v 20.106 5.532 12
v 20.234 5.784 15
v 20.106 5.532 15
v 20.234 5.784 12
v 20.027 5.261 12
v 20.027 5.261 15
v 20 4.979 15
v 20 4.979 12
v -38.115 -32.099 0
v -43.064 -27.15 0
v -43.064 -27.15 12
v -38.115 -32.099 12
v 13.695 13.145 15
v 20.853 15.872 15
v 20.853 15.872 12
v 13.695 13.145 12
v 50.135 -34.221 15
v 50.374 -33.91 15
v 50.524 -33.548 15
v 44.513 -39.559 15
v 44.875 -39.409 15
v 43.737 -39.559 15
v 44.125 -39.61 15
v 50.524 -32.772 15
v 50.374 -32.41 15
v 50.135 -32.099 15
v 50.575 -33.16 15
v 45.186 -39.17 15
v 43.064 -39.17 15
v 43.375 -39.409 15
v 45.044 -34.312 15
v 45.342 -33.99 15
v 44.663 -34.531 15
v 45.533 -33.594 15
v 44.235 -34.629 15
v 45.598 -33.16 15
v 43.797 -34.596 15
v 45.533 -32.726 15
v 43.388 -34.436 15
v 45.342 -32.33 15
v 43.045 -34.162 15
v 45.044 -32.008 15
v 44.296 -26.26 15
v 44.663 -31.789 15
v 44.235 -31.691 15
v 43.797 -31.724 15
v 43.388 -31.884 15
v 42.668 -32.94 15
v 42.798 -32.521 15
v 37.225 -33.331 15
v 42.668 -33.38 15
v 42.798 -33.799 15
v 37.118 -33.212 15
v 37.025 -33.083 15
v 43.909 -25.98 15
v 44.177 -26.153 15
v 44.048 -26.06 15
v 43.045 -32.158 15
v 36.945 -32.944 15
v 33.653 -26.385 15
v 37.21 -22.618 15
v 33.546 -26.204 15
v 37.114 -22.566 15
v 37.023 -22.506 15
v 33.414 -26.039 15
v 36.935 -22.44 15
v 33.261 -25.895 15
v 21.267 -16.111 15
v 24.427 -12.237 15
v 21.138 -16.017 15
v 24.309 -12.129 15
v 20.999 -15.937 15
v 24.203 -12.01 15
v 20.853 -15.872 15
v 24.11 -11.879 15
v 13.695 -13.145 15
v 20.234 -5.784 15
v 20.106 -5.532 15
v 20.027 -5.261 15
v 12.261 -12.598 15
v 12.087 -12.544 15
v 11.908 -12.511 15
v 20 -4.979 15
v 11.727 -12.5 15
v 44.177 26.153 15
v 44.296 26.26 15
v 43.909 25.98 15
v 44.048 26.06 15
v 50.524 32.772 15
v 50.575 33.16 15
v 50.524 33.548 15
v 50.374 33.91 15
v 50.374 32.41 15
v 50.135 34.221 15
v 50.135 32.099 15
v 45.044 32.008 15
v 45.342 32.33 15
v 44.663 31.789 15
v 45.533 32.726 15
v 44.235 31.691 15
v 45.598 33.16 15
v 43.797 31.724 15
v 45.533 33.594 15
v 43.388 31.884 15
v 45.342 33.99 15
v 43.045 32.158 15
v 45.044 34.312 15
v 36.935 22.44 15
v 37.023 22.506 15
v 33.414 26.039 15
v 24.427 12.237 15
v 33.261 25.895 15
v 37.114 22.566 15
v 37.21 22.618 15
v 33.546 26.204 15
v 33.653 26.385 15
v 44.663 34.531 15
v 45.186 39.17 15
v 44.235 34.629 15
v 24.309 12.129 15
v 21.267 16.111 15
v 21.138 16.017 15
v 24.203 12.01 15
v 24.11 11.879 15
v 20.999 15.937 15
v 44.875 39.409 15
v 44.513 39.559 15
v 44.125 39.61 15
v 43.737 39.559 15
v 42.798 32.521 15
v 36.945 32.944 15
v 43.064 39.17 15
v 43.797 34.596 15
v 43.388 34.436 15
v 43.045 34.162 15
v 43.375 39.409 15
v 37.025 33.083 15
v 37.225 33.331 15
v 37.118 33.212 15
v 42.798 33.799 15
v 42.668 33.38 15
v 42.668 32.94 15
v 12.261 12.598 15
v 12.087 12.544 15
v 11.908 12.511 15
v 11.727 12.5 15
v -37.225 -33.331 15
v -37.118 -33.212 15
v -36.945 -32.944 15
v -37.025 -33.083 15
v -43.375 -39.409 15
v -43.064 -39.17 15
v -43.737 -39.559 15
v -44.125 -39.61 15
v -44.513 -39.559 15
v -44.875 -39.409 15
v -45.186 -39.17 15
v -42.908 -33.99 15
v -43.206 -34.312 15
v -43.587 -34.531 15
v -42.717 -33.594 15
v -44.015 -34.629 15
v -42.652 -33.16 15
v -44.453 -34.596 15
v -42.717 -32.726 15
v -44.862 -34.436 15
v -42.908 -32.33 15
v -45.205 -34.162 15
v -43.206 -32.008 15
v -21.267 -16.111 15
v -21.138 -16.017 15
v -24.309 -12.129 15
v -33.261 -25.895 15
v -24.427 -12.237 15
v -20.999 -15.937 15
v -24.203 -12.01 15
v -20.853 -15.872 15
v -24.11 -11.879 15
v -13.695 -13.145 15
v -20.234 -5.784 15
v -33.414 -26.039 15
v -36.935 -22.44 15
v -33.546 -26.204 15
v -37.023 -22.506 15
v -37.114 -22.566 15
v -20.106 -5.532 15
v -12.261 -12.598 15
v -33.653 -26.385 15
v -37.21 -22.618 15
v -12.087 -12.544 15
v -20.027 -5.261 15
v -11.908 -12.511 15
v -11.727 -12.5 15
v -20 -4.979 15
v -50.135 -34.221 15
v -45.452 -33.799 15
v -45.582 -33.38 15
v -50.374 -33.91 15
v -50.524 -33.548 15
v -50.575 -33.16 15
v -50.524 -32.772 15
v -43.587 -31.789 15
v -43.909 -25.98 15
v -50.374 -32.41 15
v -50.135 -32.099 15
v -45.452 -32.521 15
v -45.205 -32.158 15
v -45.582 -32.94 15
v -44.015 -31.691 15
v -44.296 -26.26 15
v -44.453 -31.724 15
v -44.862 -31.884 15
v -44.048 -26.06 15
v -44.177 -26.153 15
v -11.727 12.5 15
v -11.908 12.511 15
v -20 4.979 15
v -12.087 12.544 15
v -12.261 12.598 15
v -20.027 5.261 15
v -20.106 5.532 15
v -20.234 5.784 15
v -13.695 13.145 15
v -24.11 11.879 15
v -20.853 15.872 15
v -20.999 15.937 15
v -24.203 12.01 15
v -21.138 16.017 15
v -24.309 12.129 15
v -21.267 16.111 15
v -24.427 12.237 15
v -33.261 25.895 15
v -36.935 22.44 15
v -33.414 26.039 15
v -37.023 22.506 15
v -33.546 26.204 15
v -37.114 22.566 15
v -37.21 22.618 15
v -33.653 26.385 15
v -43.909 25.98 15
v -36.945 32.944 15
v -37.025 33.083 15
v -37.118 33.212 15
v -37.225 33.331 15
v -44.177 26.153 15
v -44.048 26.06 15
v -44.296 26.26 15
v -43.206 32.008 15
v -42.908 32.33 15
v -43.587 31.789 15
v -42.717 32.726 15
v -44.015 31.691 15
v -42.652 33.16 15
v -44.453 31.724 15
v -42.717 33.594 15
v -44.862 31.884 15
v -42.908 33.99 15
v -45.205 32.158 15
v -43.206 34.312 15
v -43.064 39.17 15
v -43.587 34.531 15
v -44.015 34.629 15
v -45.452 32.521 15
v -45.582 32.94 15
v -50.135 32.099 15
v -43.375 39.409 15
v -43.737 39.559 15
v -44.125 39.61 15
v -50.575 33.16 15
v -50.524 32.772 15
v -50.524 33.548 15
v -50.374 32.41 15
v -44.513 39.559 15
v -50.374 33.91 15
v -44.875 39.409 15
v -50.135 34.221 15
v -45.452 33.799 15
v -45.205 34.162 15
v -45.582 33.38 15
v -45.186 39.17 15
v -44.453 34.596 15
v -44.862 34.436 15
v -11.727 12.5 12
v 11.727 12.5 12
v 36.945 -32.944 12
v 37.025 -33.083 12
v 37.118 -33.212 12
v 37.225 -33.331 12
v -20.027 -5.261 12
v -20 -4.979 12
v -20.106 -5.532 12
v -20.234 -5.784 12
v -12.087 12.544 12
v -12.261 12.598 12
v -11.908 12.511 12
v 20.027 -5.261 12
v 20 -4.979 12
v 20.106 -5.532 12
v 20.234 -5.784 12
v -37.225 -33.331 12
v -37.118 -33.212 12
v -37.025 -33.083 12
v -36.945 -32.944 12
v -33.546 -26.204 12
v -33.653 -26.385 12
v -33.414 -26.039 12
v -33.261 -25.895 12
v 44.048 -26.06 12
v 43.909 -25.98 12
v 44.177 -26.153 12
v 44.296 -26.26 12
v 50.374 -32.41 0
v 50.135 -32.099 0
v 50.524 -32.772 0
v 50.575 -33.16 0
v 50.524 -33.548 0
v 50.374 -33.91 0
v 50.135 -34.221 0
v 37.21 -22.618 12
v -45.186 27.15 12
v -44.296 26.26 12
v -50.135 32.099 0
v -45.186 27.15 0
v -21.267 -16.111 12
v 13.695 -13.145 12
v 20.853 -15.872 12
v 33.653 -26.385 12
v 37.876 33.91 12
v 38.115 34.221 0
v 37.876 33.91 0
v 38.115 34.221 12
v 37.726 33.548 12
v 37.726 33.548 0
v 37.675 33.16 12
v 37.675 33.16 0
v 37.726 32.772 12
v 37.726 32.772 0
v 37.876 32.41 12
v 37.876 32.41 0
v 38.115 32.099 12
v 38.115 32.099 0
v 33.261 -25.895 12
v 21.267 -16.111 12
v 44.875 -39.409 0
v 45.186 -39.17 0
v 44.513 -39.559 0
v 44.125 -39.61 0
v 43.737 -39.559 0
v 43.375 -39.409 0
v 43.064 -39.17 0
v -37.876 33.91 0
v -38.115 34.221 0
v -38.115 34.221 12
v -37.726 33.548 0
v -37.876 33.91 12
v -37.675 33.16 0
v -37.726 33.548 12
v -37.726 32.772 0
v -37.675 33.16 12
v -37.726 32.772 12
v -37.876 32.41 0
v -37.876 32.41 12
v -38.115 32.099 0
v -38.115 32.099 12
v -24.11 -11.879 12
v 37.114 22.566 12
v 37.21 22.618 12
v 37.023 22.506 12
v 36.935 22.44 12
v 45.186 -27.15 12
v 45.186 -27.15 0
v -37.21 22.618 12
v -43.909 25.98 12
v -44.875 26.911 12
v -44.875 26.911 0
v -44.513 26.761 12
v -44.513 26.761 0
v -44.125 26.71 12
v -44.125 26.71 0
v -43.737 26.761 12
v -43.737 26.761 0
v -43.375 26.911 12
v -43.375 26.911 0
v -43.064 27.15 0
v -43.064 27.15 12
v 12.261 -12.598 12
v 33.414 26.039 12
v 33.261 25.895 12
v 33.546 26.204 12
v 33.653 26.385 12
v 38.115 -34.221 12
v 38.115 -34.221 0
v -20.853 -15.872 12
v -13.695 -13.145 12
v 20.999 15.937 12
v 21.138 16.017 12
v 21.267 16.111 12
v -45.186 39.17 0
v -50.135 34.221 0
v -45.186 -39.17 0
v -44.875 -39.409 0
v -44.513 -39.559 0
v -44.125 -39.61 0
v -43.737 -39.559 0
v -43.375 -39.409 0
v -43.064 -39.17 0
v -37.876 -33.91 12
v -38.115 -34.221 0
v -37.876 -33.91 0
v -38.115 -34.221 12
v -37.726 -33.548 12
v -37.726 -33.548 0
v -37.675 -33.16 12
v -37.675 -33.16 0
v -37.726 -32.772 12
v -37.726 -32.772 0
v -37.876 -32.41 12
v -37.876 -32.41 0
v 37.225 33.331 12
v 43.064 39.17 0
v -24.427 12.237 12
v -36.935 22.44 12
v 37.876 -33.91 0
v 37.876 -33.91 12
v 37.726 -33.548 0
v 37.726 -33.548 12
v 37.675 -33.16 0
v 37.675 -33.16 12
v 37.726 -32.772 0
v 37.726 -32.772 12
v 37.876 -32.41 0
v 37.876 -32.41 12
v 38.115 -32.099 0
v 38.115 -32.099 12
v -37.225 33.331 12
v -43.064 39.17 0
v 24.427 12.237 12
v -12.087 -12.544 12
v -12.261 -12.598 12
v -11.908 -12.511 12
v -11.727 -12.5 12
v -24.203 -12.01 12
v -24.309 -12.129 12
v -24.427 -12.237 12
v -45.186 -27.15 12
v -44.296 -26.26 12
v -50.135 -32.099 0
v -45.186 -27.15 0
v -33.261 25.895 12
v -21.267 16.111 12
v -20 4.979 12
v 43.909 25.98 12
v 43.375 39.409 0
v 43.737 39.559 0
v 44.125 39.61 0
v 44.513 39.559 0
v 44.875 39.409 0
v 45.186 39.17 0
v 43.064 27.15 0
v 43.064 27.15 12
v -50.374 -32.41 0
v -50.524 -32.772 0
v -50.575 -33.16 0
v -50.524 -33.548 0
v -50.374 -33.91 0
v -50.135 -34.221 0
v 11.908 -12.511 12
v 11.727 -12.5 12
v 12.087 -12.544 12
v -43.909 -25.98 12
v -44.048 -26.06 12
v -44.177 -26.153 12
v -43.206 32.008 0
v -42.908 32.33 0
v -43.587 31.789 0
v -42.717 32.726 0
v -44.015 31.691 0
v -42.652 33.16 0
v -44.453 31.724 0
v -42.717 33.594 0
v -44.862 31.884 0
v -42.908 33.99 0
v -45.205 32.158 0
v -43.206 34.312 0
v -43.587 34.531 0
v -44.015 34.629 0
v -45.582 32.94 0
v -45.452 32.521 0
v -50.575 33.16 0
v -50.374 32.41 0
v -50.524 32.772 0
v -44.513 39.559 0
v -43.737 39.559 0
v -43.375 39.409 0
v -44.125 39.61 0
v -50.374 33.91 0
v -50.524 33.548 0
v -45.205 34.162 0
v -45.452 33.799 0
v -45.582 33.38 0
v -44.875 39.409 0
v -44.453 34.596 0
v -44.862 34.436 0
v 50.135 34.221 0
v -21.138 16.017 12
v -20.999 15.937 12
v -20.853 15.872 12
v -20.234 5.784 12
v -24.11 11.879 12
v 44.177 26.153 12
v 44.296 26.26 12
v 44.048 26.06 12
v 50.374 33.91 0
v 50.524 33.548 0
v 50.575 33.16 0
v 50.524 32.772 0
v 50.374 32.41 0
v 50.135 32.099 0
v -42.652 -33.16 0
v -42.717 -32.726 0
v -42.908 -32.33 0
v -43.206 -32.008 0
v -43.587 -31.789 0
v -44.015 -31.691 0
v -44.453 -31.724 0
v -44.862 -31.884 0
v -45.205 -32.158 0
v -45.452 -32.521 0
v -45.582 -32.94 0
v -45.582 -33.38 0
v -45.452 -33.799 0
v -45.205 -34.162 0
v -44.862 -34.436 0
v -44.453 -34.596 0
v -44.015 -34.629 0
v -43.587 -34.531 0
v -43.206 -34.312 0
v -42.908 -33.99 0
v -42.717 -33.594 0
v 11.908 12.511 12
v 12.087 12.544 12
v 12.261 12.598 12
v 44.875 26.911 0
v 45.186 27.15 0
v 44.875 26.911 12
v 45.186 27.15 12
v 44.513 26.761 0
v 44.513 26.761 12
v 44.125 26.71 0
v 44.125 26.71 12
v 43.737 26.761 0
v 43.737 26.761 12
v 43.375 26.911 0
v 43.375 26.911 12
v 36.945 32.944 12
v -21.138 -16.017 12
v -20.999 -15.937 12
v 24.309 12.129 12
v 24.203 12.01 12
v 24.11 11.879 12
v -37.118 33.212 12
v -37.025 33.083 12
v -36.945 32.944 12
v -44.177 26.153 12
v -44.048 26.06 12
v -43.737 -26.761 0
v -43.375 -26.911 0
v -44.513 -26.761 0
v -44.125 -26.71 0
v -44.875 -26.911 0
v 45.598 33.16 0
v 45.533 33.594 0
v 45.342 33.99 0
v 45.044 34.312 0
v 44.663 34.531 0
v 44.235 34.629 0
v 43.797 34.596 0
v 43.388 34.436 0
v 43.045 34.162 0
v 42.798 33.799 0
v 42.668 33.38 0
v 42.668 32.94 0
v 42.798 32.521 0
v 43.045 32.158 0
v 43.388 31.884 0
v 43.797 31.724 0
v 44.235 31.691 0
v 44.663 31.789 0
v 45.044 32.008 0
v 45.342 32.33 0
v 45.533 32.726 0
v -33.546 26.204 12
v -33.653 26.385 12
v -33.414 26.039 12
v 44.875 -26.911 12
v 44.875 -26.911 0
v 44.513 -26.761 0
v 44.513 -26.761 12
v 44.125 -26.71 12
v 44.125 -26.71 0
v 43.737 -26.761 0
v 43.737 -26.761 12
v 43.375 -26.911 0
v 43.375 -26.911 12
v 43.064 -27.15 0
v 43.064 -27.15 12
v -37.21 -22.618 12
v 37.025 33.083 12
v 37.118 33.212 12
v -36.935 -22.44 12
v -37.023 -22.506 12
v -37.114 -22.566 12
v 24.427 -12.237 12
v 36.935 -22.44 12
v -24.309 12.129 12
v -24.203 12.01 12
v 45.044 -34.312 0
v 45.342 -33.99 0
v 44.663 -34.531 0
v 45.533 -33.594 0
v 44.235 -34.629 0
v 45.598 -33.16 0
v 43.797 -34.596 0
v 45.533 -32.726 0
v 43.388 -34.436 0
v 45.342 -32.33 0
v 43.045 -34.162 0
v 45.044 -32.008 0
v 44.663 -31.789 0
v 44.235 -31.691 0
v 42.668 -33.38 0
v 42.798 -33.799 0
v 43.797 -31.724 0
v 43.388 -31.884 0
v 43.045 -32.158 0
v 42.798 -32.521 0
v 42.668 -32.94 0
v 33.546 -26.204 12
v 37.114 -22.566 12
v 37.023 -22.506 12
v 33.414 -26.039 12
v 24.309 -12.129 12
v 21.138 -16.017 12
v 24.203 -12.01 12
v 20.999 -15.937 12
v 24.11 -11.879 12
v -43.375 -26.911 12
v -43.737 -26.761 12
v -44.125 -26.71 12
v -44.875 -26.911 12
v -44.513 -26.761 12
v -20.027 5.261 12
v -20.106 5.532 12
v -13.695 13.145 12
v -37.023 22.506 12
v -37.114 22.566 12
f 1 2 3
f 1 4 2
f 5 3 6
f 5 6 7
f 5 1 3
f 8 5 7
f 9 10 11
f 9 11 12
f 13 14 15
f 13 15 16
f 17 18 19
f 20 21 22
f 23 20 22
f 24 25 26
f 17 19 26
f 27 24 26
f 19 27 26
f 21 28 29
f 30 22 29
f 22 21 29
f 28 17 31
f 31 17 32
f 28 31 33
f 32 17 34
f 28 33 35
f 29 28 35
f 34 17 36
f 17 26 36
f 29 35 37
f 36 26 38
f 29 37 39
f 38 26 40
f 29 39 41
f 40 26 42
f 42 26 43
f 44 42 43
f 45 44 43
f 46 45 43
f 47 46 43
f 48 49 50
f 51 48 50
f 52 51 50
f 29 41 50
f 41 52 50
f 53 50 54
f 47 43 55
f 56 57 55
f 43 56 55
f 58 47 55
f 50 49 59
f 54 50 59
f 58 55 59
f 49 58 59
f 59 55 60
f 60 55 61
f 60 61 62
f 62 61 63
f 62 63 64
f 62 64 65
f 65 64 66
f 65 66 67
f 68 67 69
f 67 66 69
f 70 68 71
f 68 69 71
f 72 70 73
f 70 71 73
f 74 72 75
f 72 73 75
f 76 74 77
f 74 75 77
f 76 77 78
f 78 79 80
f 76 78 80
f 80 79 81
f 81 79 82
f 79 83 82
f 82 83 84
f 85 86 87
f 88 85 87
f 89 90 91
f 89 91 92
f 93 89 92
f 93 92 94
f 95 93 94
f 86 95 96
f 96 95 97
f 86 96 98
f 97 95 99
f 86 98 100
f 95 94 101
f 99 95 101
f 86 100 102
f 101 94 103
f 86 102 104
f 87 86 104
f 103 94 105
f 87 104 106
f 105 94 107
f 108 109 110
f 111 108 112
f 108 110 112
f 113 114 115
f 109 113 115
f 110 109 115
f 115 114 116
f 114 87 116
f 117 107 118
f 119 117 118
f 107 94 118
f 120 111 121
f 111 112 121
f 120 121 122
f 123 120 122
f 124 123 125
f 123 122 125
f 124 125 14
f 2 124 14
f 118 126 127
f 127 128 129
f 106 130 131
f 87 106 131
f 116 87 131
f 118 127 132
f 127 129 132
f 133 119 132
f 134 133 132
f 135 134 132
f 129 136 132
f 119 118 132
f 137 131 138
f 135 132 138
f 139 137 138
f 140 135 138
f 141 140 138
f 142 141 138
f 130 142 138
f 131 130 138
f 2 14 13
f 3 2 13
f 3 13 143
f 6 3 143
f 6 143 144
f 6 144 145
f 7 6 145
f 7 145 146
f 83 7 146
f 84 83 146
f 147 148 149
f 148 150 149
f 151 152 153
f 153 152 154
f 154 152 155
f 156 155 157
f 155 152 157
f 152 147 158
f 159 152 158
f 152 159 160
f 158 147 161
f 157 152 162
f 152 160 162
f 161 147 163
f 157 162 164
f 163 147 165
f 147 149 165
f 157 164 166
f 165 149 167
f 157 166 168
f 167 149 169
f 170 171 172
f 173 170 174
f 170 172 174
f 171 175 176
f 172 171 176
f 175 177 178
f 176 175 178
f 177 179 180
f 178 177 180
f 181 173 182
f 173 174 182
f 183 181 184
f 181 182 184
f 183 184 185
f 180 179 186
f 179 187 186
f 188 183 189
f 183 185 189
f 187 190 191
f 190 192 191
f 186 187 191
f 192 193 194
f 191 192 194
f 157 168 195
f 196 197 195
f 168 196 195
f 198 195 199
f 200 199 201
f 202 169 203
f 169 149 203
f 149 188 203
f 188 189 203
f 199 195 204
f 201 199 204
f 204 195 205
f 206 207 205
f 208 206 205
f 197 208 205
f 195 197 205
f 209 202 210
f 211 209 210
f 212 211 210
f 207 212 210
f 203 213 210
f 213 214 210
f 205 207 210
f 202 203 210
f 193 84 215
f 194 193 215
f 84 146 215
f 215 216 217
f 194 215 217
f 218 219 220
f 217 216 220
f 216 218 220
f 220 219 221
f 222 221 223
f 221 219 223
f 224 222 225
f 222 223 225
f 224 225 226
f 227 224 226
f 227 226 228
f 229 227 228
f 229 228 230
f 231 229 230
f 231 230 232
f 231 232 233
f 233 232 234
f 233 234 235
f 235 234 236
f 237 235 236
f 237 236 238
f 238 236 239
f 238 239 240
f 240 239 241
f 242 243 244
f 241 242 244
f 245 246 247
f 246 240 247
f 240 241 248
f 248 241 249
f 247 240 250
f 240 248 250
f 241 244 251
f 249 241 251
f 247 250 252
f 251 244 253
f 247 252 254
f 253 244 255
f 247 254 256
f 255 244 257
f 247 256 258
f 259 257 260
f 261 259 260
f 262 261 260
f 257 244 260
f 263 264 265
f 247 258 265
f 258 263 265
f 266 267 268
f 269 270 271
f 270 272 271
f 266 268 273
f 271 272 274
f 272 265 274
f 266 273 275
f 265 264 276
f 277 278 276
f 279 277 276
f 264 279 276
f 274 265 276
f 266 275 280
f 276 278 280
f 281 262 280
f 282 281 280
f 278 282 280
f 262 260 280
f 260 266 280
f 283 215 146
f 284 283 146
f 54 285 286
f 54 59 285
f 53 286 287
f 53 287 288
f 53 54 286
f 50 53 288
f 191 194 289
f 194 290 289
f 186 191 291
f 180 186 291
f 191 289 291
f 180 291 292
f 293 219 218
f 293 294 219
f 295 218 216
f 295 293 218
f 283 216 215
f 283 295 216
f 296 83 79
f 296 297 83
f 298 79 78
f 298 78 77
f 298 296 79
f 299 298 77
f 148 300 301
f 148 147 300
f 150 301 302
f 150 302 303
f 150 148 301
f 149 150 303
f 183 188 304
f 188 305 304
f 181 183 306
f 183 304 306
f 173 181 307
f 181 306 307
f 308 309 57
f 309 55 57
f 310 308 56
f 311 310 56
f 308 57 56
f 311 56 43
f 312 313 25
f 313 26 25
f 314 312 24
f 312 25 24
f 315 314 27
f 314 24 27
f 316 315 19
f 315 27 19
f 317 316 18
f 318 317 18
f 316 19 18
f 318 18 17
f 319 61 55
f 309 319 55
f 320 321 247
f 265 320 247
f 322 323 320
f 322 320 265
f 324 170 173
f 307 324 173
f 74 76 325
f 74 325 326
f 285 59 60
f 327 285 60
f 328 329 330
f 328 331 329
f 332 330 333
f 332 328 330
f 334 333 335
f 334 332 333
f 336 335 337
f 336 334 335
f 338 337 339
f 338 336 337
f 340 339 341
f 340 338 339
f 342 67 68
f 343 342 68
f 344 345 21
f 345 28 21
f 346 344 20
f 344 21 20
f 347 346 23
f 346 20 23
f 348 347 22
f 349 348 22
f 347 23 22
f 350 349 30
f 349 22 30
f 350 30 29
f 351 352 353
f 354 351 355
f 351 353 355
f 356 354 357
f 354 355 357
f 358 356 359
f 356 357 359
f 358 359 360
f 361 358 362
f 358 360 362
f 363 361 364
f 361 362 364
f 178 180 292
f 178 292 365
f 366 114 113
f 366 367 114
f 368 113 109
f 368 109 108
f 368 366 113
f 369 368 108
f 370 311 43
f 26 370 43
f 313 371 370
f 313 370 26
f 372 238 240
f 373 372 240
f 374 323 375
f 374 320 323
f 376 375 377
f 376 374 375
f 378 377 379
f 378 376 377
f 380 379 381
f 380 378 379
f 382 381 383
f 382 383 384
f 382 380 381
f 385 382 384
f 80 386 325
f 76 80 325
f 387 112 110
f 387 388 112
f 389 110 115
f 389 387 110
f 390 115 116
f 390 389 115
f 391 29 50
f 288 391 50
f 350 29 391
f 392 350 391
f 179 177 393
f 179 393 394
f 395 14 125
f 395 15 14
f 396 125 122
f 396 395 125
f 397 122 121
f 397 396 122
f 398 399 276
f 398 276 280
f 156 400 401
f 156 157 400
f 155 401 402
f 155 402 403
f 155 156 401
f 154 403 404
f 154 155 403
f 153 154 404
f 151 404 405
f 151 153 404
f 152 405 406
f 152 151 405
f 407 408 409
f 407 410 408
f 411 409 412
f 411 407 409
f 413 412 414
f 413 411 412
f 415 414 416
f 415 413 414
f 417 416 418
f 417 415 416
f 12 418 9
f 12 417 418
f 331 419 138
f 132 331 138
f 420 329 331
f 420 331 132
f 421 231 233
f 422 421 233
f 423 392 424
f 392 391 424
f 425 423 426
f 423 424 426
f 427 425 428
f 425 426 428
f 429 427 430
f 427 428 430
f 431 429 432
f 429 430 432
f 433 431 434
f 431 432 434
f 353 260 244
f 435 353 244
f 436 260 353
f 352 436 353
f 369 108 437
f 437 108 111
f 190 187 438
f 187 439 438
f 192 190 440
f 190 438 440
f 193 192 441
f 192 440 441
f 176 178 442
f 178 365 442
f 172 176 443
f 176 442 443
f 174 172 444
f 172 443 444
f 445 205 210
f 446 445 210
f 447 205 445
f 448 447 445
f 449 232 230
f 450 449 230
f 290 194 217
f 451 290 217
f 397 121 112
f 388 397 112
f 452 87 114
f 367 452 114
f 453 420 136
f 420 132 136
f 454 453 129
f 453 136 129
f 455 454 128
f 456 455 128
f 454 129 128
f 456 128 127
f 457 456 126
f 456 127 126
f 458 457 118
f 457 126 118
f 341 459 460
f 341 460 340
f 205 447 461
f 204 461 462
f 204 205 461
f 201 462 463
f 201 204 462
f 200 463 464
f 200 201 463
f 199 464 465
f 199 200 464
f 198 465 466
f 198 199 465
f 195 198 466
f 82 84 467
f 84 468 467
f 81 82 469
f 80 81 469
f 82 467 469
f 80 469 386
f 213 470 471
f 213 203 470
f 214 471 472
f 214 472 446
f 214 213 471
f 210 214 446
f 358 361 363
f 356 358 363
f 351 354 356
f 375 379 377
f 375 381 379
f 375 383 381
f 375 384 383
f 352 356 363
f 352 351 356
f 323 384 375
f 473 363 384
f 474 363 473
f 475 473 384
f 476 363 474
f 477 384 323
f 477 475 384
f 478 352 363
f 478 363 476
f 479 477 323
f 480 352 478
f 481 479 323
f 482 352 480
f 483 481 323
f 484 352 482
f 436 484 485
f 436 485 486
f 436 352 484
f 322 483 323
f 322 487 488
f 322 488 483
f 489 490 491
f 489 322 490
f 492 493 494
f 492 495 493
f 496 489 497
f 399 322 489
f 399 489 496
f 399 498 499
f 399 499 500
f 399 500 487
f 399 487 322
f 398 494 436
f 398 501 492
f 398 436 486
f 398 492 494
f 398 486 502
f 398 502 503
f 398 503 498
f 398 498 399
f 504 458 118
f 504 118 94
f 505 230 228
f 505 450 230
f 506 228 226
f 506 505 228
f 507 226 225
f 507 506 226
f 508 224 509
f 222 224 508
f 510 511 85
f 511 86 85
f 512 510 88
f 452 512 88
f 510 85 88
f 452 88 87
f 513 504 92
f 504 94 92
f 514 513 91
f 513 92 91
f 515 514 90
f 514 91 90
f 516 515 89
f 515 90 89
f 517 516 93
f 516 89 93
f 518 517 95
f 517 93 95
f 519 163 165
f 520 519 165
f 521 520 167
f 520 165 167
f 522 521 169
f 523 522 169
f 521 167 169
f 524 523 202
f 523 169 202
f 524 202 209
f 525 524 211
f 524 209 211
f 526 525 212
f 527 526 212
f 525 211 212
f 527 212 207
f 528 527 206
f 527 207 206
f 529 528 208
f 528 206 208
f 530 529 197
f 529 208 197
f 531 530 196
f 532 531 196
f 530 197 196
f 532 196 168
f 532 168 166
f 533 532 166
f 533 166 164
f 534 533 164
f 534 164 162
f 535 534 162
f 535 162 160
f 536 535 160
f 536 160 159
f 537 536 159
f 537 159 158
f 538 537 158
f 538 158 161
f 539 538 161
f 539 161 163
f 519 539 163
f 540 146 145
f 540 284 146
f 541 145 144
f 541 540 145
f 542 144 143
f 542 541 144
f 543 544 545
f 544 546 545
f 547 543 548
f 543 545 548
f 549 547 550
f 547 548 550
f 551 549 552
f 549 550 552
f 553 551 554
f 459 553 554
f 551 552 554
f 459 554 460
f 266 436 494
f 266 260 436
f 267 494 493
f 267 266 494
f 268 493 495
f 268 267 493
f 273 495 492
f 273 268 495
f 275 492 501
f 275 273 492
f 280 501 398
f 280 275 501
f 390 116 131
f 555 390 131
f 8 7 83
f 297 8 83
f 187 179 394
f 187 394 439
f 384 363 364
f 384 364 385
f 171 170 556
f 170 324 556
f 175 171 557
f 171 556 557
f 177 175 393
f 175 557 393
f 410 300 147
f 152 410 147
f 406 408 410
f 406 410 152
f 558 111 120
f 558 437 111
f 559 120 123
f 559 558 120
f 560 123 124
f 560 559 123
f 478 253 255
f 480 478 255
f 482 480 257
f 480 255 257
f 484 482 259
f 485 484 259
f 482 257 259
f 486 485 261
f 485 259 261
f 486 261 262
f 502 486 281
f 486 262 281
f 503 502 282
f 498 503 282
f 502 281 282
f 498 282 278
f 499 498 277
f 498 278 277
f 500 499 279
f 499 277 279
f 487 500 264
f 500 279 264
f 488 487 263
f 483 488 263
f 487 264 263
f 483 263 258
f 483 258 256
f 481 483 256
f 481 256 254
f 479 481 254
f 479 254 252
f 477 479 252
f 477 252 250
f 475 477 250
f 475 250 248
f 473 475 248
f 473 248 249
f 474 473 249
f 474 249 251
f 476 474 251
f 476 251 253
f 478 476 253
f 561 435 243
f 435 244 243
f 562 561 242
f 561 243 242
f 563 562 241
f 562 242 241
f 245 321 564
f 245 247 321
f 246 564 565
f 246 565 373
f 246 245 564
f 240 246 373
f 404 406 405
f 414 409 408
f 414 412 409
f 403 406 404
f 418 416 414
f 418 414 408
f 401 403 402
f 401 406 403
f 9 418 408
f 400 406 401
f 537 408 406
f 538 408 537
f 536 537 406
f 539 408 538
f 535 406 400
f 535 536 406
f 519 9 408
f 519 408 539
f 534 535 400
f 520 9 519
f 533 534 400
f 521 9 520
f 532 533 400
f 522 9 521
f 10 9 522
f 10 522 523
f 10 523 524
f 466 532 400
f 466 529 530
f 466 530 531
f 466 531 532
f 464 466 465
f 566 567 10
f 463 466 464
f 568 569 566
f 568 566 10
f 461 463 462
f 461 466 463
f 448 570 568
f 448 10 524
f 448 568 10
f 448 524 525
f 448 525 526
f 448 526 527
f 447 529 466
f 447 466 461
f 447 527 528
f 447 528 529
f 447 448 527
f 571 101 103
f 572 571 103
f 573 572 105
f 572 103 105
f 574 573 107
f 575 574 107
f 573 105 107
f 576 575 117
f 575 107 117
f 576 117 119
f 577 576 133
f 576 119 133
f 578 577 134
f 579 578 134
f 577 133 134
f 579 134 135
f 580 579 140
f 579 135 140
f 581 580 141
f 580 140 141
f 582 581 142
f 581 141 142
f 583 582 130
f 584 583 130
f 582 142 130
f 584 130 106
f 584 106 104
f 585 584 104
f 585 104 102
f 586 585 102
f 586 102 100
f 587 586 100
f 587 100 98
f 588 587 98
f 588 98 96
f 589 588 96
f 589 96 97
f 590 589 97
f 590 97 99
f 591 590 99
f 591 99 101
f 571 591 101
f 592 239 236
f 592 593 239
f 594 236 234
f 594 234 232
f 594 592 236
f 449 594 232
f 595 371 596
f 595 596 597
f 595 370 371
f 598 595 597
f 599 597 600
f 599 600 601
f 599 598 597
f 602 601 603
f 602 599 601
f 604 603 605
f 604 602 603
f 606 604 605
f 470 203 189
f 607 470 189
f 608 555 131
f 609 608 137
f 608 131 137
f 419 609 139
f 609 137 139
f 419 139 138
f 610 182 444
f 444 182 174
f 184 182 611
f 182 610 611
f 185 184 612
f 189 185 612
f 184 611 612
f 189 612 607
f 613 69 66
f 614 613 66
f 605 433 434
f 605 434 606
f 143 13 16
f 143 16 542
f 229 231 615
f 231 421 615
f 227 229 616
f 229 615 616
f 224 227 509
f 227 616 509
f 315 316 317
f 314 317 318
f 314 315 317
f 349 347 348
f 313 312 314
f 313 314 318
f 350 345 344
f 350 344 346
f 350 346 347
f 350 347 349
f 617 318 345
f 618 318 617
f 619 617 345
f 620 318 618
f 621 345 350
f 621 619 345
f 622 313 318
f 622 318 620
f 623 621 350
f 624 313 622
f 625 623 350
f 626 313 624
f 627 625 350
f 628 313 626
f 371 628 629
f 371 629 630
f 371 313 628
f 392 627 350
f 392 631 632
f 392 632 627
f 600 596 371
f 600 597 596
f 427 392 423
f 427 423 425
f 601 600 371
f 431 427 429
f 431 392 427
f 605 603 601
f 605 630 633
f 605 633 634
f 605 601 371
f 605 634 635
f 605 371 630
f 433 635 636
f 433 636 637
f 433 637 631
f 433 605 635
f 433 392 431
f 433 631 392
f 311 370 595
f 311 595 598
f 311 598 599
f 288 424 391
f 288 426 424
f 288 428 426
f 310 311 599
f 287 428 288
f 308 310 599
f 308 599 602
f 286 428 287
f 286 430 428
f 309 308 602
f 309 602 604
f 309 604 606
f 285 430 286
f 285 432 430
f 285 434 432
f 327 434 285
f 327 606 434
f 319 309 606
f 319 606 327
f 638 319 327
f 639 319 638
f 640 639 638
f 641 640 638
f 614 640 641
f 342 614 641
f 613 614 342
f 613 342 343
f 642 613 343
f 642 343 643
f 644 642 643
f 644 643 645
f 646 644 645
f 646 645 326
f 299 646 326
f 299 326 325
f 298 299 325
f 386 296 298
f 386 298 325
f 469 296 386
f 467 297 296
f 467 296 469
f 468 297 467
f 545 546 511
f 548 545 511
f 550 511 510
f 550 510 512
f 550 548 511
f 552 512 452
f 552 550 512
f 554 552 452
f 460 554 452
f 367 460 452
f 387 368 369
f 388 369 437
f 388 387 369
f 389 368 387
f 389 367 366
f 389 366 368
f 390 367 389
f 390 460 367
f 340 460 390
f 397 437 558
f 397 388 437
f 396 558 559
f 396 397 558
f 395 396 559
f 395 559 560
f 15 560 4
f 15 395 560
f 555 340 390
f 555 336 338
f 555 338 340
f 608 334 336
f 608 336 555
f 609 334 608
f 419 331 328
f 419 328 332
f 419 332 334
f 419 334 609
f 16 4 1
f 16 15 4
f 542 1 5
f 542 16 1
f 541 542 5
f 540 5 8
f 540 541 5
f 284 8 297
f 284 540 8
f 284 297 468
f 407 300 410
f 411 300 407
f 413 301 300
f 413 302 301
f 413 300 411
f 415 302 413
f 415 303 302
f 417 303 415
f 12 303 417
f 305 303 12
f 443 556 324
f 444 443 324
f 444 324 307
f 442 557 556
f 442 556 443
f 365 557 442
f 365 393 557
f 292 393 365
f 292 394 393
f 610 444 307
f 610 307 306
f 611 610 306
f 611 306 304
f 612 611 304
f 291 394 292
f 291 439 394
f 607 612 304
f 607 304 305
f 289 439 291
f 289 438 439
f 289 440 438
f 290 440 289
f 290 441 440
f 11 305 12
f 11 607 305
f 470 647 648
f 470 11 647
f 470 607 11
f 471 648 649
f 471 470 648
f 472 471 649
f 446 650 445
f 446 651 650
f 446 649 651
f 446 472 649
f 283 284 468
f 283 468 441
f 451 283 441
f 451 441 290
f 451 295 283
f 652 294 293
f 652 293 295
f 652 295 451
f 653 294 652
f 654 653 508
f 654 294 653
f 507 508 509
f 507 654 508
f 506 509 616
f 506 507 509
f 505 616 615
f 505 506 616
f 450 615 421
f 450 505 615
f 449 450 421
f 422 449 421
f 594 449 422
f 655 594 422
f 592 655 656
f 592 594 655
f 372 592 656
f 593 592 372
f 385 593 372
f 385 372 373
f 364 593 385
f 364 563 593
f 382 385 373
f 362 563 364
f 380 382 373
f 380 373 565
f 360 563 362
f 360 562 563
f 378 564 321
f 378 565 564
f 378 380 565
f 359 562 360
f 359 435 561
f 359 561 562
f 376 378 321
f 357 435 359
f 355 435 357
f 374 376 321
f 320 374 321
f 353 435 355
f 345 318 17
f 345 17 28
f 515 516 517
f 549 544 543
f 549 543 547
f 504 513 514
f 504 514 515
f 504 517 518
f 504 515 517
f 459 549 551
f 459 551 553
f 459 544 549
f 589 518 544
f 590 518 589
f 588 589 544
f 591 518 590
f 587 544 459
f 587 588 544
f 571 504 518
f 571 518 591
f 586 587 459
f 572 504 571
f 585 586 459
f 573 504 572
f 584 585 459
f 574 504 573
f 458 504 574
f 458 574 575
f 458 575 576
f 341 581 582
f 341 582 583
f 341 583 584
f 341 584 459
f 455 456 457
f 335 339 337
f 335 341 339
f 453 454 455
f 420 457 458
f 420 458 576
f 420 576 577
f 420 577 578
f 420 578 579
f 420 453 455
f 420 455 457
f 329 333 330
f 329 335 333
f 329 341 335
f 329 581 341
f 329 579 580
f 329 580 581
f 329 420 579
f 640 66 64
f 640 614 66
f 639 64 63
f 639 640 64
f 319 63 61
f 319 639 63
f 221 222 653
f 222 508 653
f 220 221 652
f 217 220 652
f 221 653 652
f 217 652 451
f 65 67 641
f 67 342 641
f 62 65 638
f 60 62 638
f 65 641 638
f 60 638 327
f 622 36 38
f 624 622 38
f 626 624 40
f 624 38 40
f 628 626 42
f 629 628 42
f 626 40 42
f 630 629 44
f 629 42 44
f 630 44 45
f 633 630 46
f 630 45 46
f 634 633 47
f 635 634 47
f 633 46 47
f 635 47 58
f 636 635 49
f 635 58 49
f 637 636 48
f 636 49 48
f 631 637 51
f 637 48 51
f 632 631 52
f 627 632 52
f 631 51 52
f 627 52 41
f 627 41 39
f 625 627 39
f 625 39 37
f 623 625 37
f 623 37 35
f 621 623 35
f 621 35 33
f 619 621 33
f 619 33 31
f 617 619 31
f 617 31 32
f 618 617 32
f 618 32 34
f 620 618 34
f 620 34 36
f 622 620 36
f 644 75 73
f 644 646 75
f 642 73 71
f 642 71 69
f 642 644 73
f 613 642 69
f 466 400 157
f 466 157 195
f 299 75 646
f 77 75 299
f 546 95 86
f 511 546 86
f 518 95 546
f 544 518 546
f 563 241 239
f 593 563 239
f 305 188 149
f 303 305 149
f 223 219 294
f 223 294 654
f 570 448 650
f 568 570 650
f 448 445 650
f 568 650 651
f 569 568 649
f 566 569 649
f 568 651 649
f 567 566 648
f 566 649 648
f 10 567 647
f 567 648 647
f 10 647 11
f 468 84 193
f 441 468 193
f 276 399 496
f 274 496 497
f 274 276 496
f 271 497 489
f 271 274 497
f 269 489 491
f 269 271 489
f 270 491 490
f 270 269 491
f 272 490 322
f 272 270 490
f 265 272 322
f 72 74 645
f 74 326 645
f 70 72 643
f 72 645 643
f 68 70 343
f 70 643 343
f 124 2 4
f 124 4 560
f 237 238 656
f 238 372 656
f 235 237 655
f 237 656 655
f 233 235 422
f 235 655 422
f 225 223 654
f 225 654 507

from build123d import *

# Parameters (mm, degrees)
BOSS_EXTRUDE1_DEPTH   = 15
BOSS_EXTRUDE1_2_DEPTH = 15
BOSS_EXTRUDE1_3_DEPTH = 15
BOSS_EXTRUDE1_4_DEPTH = 15
BOSS_EXTRUDE2_DEPTH   = 3
F_2_CLEARANCE_HOLE1_D = 2.9464
FILLET2_R             = 1.5
FILLET3_R             = 1.5


with BuildPart() as part:
    # Sketch1 → Boss-Extrude1 (new body)
    with BuildSketch(Plane.XY):
        Polygon((-51.196067812, 33.16), (-44.125, 40.231067812), (-37.053932188, 33.16), (-44.125, 26.088932188), align=None)
    extrude(amount=BOSS_EXTRUDE1_DEPTH)



with BuildPart() as body_2:
    # Sketch1 → Boss-Extrude1 2 (new body)
    with BuildSketch(Plane.XY):
        Polygon((44.125, 26.088932188), (37.053932188, 33.16), (44.125, 40.231067812), (51.196067812, 33.16), align=None)
    extrude(amount=BOSS_EXTRUDE1_2_DEPTH)


with BuildPart() as body_3:
    # Sketch1 → Boss-Extrude1 3 (new body)
    with BuildSketch(Plane.XY):
        Polygon((37.053932188, -33.16), (44.125, -26.088932188), (51.196067812, -33.16), (44.125, -40.231067812), align=None)
    extrude(amount=BOSS_EXTRUDE1_3_DEPTH)


with BuildPart() as body_4:
    # Sketch1 → Boss-Extrude1 4 (new body)
    with BuildSketch(Plane.XY):
        Polygon((-44.125, -40.231067812), (-51.196067812, -33.16), (-44.125, -26.088932188), (-37.053932188, -33.16), align=None)
    extrude(amount=BOSS_EXTRUDE1_4_DEPTH)


with BuildPart() as part_1:
    add(part.part)

    add(body_2.part)  # Boss-Extrude2 merges body 2

    add(body_3.part)  # Boss-Extrude2 merges body 3

    add(body_4.part)  # Boss-Extrude2 merges body 4
    # Sketch2 → Boss-Extrude2 (add)
    with BuildSketch(Plane.XY.offset(15)):
        Polygon((-16.839511506, 12.5), (16.839511506, 12.5), (33.509317925, 26.098012545), (37.053932188, 33.16), (44.125, 26.088932188), (37.063012545, 22.544317925), (20, 8.625556495), (20, -8.625556495), (37.063012545, -22.544317925), (44.125, -26.088932188), (37.053932188, -33.16), (33.509317925, -26.098012545), (16.839511506, -12.5), (-16.839511506, -12.5), (-33.509317925, -26.098012545), (-37.053932188, -33.16), (-44.125, -26.088932188), (-37.063012545, -22.544317925), (-20, -8.625556495), (-20, 8.625556495), align=None)
        Polygon((-13.695257257, 13.144844299), (-21.07904964, 15.95830607), (-16.839511506, 12.5), (-12.002895034, 12.5), align=None)
        Polygon((-16.839511506, 12.5), (-20, 8.625556495), (-37.063012545, 22.544317925), (-44.125, 26.088932188), (-37.053932188, 33.16), (-33.509317925, 26.098012545), align=None)
        Polygon((-20, 8.625556495), (-24.239538134, 12.083862565), (-20, 5.415858854), align=None)
        Polygon((-20, -8.625556495), (-20, -5.415858854), (-24.239538134, -12.083862565), align=None)
        Polygon((-16.839511506, -12.5), (-21.07904964, -15.95830607), (-13.695257257, -13.144844299), (-12.002895034, -12.5), align=None)
        Polygon((16.839511506, -12.5), (12.002895034, -12.5), (13.695257257, -13.144844299), (21.07904964, -15.95830607), align=None)
        Polygon((24.239538134, -12.083862565), (20, -5.415858854), (20, -8.625556495), align=None)
        Polygon((20, 5.415858854), (24.239538134, 12.083862565), (20, 8.625556495), align=None)
        Polygon((13.695257257, 13.144844299), (12.002895034, 12.5), (16.839511506, 12.5), (21.07904964, 15.95830607), align=None)
    extrude(amount=-BOSS_EXTRUDE2_DEPTH)

    # #2 Clearance Hole1 (through all)
    with Locations(Plane(origin=(0, 0, 0), x_dir=(-1, 0, 0), z_dir=(0, 0, -1))):
        with Locations((-44.125, 33.16), (44.125, 33.16), (44.125, -33.16), (-44.125, -33.16)):
            Hole(F_2_CLEARANCE_HOLE1_D / 2)

    # Fillet2
    fillet2_edges = [part_1.edges().sort_by_distance(p)[0] for p in [
        (37.053932188, 33.16, 6),
        (44.125, 26.088932188, 6),
        (51.196067812, 33.16, 7.5),
        (44.125, 40.231067812, 7.5),
        (44.125, -26.088932188, 6),
        (37.053932188, -33.16, 6),
        (44.125, -40.231067812, 7.5),
        (51.196067812, -33.16, 7.5),
        (-44.125, -40.231067812, 7.5),
        (-37.053932188, -33.16, 6),
        (-44.125, -26.088932188, 6),
        (-51.196067812, -33.16, 7.5),
        (-37.053932188, 33.16, 6),
        (-44.125, 26.088932188, 6),
        (-51.196067812, 33.16, 7.5),
        (-44.125, 40.231067812, 7.5),
    ]]
    fillet(fillet2_edges, radius=FILLET2_R)

    # Fillet3
    fillet3_edges = [part_1.edges().sort_by_distance(p)[0] for p in [
        (20, 5.415858854, 13.5),
        (20, -5.415858854, 13.5),
        (24.239538134, -12.083862565, 13.5),
        (37.063012545, -22.544317925, 13.5),
        (44.125, -26.088932188, 13.5),
        (37.053932188, -33.16, 13.5),
        (33.509317925, -26.098012545, 13.5),
        (21.07904964, -15.95830607, 13.5),
        (12.002895034, -12.5, 13.5),
        (-12.002895034, -12.5, 13.5),
        (-21.07904964, -15.95830607, 13.5),
        (-33.509317925, -26.098012545, 13.5),
        (-37.053932188, -33.16, 13.5),
        (-44.125, -26.088932188, 13.5),
        (-37.063012545, -22.544317925, 13.5),
        (-24.239538134, -12.083862565, 13.5),
        (-20, -5.415858854, 13.5),
        (-20, 5.415858854, 13.5),
        (-24.239538134, 12.083862565, 13.5),
        (-37.063012545, 22.544317925, 13.5),
        (-33.509317925, 26.098012545, 13.5),
        (-21.07904964, 15.95830607, 13.5),
        (-12.002895034, 12.5, 13.5),
        (12.002895034, 12.5, 13.5),
        (21.07904964, 15.95830607, 13.5),
        (33.509317925, 26.098012545, 13.5),
        (37.053932188, 33.16, 13.5),
        (44.125, 26.088932188, 13.5),
        (37.063012545, 22.544317925, 13.5),
        (24.239538134, 12.083862565, 13.5),
        (-37.053932188, 33.16, 13.5),
        (-44.125, 26.088932188, 13.5),
    ]]
    fillet(fillet3_edges, radius=FILLET3_R)


solid = part_1.part
